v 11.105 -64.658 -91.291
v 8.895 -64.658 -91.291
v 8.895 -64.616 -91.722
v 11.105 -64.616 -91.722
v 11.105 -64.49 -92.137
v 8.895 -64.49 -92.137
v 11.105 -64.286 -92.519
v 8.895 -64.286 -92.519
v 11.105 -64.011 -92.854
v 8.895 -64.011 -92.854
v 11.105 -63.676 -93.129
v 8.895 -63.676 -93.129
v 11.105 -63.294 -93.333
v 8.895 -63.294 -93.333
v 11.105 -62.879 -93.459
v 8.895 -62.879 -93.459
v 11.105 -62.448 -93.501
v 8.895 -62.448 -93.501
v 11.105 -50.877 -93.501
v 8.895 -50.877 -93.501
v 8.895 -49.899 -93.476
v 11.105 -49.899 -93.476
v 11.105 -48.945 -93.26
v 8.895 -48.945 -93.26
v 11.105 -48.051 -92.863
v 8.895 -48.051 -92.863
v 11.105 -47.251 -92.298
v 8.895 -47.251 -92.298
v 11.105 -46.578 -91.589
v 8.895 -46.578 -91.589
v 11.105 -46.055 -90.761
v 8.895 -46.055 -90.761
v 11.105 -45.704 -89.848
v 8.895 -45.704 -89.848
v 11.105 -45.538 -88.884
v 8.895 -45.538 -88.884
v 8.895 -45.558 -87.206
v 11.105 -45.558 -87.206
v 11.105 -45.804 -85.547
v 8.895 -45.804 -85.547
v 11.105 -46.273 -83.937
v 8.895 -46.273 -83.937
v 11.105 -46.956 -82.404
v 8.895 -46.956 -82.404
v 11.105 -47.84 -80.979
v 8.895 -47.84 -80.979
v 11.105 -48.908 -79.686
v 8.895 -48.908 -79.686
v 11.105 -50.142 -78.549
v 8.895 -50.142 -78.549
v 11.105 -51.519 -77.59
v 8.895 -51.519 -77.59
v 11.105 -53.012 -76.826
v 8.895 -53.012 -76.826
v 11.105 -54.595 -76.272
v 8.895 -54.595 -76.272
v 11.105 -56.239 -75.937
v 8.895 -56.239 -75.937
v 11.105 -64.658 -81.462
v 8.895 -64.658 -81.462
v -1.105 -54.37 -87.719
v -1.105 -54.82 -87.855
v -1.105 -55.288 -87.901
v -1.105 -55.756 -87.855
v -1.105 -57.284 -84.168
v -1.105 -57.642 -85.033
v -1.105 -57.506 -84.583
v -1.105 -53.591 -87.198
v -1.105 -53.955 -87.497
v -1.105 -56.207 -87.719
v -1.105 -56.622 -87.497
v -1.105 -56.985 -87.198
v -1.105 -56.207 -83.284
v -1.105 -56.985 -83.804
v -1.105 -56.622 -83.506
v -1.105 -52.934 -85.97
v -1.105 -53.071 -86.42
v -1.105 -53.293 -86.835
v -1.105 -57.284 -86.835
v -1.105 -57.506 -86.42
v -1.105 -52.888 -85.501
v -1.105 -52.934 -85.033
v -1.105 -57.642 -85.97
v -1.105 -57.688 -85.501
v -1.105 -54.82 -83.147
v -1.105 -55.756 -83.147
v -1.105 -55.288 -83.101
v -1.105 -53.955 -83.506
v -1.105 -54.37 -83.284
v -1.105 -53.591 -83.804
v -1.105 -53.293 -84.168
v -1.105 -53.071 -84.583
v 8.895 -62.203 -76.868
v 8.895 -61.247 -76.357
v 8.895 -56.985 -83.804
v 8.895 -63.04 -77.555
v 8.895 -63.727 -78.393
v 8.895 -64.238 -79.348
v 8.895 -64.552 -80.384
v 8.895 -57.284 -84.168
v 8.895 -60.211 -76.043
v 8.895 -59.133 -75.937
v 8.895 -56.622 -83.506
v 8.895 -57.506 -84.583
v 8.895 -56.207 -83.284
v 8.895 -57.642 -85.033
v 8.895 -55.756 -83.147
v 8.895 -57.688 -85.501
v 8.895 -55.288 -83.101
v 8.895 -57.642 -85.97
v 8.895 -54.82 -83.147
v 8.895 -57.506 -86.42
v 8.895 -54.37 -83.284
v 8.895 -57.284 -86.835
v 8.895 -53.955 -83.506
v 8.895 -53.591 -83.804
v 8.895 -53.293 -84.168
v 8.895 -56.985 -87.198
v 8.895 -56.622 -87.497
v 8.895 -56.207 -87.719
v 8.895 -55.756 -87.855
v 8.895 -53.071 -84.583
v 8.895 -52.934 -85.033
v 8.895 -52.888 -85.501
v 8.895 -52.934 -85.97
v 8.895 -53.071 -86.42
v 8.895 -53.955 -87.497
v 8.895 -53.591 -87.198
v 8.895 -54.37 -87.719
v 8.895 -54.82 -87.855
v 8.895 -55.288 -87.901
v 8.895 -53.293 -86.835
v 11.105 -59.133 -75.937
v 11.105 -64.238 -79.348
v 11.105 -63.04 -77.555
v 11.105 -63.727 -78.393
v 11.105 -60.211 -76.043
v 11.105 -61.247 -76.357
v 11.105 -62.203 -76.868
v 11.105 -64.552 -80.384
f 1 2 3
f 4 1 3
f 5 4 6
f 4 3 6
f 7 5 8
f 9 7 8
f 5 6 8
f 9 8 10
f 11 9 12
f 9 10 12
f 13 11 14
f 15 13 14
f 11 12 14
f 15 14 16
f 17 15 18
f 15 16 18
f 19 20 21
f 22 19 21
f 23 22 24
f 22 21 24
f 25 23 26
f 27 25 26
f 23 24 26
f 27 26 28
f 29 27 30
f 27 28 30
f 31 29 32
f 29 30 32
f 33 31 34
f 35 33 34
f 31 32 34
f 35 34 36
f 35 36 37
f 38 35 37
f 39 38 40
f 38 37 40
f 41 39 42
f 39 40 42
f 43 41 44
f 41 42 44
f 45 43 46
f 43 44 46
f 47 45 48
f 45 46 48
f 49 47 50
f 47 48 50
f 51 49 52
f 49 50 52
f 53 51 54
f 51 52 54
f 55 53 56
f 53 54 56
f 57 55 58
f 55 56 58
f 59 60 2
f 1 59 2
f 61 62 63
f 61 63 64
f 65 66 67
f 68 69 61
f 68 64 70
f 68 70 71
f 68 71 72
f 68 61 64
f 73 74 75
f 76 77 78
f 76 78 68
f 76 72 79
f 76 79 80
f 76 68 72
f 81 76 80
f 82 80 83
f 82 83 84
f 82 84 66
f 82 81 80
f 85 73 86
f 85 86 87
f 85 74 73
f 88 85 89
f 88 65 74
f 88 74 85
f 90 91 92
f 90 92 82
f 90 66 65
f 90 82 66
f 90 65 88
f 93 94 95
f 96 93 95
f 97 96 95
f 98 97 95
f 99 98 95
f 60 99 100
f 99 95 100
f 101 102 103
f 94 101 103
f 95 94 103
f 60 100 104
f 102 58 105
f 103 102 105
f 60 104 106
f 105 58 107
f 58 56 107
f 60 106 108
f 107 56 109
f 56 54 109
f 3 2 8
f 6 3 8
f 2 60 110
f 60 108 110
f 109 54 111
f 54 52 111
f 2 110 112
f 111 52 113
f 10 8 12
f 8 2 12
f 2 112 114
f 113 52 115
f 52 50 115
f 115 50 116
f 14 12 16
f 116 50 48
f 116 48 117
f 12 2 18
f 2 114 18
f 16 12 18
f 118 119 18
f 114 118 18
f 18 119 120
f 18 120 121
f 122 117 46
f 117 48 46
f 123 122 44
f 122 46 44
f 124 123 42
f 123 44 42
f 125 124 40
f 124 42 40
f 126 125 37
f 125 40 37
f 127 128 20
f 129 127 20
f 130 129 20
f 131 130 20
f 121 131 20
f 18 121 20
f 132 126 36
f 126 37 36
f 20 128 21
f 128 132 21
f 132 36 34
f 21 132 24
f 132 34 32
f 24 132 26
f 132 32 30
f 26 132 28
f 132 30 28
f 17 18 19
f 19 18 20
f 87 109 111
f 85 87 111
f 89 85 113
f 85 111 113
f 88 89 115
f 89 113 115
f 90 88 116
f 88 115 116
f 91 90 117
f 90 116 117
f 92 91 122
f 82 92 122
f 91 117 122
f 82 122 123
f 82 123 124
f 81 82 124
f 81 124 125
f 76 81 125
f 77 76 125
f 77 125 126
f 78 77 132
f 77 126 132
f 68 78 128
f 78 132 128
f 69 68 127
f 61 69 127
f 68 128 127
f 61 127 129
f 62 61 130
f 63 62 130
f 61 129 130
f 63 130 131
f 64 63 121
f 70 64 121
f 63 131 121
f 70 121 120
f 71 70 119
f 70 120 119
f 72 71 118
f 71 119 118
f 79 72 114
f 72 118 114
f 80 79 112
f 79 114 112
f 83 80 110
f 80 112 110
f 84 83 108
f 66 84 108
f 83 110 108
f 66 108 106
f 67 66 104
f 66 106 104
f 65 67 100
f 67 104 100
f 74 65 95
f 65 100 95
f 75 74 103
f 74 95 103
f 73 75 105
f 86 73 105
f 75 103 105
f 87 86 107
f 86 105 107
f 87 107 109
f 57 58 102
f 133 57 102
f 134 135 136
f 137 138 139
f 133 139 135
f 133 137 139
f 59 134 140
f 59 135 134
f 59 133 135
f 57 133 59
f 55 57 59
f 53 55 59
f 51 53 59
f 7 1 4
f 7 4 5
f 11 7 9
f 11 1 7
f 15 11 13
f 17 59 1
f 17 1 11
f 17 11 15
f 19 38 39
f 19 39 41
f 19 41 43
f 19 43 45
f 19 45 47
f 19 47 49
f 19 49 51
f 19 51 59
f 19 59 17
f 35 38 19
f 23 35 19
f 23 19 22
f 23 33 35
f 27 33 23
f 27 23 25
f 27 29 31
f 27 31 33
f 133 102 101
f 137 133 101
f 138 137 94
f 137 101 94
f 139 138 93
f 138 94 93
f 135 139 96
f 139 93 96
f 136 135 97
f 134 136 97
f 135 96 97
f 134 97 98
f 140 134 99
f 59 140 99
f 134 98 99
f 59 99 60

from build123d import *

# Parameters (mm, degrees)
BOSS_EXTRUDE1_DEPTH = 20
SCALE1_SCALE        = 0.110510806
SKETCH5_R           = 2.4
BOSS_EXTRUDE2_DEPTH = 10


with BuildPart() as part:
    # Sketch3 → Boss-Extrude1 (new body)
    with BuildSketch(Plane(origin=(0, 0, 0), x_dir=(0, 0, -1), z_dir=(1, 0, 0))):
        with BuildLine():
            Line((0, -60), (0, -86.184781703))
            ThreePointArc((0, -86.184781703), (14.644660941, -121.540120762), (50, -136.184781703))
            Line((50, -136.184781703), (59.297038535, -136.184781703))
            Line((59.297038535, -136.184781703), (138.939006392, -136.184781703))
            ThreePointArc((138.939006392, -136.184781703), (153.081142016, -130.326917326), (158.939006392, -116.184781703))
            Line((158.939006392, -116.184781703), (158.939006392, -50))
            Line((158.939006392, -50), (158.939006392, -11.480346054))
            ThreePointArc((158.939006392, -11.480346054), (148.053108697, 21.328755123), (117.156078712, 36.830801017))
            ThreePointArc((117.156078712, 36.830801017), (39.60735059, 11.368133348), (0, -60))
        make_face()
    extrude(amount=BOSS_EXTRUDE1_DEPTH)


with BuildPart() as part_1:
    # Scale1: scaled about (10, -55.771836123, -85.371281571)
    add(part.part.scale(SCALE1_SCALE).moved(Location((8.89489194, -49.608445561, -75.936832435))))

    # Sketch5 → Boss-Extrude2 (add)
    with BuildSketch(Plane.ZY.offset(-8.89489194)):
        with Locations((-85.501310137, -55.288244055)):
            Circle(SKETCH5_R)
    extrude(amount=BOSS_EXTRUDE2_DEPTH)


solid = part_1.part
